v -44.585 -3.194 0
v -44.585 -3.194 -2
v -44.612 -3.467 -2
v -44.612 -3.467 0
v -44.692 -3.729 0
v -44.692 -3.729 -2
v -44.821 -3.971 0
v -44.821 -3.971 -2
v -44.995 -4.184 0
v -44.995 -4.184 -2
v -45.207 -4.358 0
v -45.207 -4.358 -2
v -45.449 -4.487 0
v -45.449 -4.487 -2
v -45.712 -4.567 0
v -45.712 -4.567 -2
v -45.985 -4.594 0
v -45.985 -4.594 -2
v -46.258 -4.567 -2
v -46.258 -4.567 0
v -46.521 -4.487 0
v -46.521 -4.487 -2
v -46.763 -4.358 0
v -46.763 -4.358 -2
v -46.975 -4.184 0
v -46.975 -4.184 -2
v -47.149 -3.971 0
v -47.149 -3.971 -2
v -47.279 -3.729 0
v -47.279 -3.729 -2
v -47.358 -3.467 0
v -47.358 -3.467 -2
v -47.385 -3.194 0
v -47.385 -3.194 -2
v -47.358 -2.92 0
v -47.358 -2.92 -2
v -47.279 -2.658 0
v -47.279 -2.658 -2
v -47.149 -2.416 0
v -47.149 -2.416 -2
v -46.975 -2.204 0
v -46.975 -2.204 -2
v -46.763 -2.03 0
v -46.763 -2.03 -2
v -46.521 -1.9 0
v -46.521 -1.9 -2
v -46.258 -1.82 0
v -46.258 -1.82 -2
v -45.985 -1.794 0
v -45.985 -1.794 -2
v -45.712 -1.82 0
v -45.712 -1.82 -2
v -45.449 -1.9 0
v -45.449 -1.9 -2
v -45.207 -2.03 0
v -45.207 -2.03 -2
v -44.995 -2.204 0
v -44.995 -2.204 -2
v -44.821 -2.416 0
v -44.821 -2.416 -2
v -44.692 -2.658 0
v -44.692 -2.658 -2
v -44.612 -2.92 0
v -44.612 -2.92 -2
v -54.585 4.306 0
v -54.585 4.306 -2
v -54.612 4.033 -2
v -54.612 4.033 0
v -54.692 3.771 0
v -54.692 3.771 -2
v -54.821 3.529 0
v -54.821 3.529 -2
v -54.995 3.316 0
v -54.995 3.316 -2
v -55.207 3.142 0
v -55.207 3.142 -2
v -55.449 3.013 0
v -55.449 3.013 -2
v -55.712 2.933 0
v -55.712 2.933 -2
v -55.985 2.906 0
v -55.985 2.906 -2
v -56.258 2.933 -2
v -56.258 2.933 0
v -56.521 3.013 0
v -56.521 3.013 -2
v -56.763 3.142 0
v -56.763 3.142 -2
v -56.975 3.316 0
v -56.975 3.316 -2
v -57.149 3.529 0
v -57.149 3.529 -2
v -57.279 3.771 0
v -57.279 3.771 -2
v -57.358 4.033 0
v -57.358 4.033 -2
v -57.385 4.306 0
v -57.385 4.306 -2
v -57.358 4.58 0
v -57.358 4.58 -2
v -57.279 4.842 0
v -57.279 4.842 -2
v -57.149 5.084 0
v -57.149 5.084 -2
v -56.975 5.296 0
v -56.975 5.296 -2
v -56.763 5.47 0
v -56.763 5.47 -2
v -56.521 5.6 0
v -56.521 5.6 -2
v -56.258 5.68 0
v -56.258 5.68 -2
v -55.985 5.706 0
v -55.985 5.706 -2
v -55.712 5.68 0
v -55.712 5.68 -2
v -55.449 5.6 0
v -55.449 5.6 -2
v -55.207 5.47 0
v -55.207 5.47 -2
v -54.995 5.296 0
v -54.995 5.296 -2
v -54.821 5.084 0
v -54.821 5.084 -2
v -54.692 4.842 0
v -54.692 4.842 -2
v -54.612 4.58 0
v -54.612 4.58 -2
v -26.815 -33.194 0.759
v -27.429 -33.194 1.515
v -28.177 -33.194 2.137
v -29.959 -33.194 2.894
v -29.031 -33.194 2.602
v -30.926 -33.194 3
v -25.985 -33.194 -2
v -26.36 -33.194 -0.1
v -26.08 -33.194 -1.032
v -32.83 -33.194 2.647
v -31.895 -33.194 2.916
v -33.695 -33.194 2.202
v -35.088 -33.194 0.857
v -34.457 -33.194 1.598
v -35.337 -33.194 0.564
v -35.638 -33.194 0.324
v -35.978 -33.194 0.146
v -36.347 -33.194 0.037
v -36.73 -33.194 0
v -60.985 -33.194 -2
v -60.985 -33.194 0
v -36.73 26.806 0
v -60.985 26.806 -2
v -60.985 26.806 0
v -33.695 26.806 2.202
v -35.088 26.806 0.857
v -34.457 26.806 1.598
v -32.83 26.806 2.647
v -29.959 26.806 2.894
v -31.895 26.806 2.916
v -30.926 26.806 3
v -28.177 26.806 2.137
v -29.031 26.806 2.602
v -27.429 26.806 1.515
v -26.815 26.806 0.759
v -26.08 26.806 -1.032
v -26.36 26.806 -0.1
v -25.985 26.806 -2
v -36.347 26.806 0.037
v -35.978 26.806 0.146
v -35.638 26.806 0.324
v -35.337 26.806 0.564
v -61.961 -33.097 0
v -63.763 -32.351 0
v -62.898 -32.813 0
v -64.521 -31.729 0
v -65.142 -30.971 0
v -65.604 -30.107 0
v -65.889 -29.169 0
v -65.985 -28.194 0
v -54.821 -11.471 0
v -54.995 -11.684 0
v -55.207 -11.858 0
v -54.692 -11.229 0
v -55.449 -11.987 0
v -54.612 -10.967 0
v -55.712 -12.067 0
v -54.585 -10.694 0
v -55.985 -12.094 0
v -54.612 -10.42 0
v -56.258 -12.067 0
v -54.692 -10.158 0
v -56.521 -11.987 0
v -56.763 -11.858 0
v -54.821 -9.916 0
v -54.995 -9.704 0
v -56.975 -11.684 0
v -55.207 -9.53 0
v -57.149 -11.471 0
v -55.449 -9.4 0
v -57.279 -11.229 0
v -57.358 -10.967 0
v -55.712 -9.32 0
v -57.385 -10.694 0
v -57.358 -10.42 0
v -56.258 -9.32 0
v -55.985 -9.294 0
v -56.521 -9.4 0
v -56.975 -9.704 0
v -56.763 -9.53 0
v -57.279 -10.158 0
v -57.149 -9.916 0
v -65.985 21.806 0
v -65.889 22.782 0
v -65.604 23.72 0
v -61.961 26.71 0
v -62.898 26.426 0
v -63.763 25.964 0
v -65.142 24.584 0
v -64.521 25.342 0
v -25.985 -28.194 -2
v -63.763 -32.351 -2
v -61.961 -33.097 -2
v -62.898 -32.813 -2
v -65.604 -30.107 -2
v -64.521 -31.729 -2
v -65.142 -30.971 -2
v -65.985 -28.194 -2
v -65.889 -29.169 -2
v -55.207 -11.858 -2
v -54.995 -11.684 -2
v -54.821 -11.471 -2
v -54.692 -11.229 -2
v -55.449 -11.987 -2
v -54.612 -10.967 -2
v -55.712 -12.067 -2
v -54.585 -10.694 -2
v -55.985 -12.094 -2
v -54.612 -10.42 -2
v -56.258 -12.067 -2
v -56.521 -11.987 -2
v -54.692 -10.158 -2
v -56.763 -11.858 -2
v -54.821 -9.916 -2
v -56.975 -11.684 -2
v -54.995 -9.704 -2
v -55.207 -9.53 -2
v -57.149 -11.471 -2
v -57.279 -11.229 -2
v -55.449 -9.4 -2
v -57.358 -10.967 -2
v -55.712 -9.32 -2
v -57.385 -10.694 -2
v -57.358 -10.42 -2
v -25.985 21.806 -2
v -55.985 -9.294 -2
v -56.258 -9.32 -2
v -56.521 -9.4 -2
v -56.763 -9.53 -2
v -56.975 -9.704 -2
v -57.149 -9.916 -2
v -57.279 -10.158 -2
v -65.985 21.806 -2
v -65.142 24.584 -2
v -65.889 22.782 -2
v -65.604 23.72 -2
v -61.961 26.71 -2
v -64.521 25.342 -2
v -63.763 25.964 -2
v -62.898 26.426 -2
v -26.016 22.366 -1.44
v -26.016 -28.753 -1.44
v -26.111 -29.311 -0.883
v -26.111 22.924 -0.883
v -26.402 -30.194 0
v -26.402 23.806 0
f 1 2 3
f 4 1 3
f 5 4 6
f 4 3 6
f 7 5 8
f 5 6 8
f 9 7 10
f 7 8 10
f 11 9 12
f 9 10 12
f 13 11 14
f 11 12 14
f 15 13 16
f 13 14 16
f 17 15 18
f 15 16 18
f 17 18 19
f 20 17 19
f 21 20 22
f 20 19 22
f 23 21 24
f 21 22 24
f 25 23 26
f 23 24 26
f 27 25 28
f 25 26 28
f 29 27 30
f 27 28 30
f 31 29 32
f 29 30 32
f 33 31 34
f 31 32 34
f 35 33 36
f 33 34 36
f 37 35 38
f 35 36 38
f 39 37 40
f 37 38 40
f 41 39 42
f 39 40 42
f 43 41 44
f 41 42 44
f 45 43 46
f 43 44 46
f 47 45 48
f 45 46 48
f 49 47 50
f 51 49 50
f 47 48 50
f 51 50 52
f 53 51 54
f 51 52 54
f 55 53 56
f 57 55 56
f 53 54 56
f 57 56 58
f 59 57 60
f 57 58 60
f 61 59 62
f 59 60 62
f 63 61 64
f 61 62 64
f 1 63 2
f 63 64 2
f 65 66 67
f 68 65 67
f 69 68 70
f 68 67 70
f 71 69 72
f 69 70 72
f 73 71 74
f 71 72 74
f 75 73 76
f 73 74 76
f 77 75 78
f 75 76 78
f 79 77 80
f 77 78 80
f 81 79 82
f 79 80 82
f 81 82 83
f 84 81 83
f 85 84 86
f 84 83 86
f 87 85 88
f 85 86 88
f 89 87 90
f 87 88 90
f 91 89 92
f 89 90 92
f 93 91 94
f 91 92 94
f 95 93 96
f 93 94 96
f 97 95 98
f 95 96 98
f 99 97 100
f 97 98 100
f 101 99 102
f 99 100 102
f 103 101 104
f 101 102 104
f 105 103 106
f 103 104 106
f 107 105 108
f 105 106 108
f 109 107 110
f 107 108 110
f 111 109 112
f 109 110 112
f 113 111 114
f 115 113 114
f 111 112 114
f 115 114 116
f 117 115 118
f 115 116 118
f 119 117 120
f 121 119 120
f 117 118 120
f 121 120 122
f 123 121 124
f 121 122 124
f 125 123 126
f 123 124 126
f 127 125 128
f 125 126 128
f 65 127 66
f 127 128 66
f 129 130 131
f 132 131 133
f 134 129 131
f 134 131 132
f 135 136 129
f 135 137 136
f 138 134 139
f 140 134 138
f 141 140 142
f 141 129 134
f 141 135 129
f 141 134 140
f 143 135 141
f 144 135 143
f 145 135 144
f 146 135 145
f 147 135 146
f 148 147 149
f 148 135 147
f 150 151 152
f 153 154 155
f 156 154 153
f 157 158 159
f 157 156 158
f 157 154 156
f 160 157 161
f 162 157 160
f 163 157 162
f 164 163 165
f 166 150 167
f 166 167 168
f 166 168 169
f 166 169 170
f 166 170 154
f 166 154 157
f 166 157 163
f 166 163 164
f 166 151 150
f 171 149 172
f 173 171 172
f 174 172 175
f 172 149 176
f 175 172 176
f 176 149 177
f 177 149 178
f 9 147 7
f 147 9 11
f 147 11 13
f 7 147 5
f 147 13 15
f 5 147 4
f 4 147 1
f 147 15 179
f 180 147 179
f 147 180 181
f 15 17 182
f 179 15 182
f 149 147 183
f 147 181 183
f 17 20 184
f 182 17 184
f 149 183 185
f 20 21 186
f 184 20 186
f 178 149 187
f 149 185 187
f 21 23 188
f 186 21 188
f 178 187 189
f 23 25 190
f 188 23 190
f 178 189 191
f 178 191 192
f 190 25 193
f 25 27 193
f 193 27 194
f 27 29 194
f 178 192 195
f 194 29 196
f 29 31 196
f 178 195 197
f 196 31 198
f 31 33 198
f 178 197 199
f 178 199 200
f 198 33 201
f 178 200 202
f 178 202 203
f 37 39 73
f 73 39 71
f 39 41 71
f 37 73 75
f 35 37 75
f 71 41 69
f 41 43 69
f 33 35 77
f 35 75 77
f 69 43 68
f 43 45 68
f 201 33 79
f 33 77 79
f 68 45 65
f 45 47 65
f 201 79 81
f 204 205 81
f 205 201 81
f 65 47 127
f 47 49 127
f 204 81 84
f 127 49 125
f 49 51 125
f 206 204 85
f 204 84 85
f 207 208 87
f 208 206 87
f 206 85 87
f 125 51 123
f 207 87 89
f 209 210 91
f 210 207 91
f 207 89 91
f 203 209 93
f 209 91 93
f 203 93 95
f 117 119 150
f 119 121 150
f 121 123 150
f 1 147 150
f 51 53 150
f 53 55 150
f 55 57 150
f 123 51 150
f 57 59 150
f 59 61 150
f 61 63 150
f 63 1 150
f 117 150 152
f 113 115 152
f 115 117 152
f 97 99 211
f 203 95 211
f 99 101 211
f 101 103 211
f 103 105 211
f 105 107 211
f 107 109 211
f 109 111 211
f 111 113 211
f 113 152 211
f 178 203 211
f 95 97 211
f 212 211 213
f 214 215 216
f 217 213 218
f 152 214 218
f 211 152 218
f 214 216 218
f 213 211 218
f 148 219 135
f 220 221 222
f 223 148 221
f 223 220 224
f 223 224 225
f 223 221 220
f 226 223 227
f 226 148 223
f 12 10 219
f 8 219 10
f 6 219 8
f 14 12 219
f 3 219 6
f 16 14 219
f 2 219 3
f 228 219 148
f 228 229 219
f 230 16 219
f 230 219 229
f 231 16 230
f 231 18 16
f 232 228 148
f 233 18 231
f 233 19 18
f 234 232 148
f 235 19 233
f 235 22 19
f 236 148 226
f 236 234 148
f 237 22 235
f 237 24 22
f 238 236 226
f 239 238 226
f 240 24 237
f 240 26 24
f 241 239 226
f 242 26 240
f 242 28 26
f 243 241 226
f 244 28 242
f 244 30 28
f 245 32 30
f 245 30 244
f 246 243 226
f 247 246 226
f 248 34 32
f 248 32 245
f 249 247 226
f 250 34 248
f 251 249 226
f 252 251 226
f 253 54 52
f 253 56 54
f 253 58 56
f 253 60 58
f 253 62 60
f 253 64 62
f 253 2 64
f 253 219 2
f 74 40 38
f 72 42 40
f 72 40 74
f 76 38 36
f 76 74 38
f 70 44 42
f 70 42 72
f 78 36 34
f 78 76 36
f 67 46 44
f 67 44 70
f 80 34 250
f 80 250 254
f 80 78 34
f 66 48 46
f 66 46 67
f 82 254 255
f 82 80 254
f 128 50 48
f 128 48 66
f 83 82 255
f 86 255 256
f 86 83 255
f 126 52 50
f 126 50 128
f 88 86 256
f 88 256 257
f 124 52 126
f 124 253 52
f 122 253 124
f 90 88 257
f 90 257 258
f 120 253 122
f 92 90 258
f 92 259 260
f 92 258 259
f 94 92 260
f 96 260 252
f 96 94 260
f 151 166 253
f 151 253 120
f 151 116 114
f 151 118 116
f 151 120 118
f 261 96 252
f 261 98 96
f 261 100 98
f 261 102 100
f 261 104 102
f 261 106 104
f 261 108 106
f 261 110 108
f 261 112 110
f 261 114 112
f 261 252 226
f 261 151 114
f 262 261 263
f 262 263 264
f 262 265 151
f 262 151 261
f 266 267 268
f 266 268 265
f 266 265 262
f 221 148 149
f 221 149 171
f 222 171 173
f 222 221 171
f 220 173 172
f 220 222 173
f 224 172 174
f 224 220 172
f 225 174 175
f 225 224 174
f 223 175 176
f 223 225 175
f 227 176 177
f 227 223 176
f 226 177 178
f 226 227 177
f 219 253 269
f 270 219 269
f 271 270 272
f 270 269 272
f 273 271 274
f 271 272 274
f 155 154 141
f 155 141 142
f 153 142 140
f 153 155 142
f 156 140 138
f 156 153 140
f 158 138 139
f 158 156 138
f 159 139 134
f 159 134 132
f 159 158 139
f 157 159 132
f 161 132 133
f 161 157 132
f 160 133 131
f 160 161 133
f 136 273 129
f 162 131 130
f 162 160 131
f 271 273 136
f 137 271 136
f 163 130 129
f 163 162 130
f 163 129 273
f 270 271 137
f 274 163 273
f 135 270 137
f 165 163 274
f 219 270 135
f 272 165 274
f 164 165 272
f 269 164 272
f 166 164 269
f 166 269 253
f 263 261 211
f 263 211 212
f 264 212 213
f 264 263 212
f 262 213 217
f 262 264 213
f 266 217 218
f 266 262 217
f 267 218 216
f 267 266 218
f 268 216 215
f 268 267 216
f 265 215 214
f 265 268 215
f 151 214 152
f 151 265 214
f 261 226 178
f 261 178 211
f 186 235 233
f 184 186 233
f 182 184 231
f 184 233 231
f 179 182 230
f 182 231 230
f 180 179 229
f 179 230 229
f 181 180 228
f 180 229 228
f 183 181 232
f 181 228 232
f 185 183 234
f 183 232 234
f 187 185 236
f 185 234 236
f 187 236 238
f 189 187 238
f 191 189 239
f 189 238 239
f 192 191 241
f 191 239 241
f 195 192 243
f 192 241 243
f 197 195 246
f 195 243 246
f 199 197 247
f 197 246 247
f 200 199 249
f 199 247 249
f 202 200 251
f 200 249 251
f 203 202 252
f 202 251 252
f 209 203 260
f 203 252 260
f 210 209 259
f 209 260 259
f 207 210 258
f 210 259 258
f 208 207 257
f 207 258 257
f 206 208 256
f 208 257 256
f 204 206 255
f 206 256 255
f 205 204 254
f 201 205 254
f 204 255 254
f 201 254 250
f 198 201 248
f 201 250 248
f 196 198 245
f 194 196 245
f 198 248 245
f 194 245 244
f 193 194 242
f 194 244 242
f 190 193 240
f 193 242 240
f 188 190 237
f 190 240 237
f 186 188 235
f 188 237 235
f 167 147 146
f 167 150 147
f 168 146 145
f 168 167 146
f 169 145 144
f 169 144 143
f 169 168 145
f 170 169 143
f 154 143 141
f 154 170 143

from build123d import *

# Parameters (mm, degrees)
SKETCH1_R           = 1.4
BOSS_EXTRUDE1_DEPTH = 2
BOSS_EXTRUDE2_DEPTH = 60
CUT_EXTRUDE1_DEPTH  = 60
FILLET1_R           = 2


with BuildPart() as part:
    # Sketch1 → Boss-Extrude1 (new body)
    with BuildSketch(Plane(origin=(0, 0, -2), x_dir=(-1, 0, 0), z_dir=(0, 0, -1))):
        with BuildLine():
            Line((60.9850693, 26.806434403), (30.9850693, 26.806434403))
            ThreePointArc((30.9850693, 26.806434403), (27.449535394, 25.341968309), (25.9850693, 21.806434403))
            Line((25.9850693, 21.806434403), (25.9850693, -28.193565597))
            ThreePointArc((25.9850693, -28.193565597), (27.449535394, -31.729099503), (30.9850693, -33.193565597))
            Line((30.9850693, -33.193565597), (60.9850693, -33.193565597))
            ThreePointArc((60.9850693, -33.193565597), (64.520603206, -31.729099503), (65.9850693, -28.193565597))
            Line((65.9850693, -28.193565597), (65.9850693, 21.806434403))
            ThreePointArc((65.9850693, 21.806434403), (64.520603206, 25.341968309), (60.9850693, 26.806434403))
        make_face()
        with Locations((55.9850693, 4.306434403)):
            Circle(SKETCH1_R, mode=Mode.SUBTRACT)
        with Locations((55.9850693, -10.693565597)):
            Circle(SKETCH1_R, mode=Mode.SUBTRACT)
        with Locations((45.9850693, -3.193565597)):
            Circle(SKETCH1_R, mode=Mode.SUBTRACT)
    extrude(amount=-BOSS_EXTRUDE1_DEPTH)

    # Sketch2 → Boss-Extrude2 (add)
    with BuildSketch(Plane(origin=(0, 26.806434403, 0), x_dir=(1, 0, 0), z_dir=(0, 1, 0))):
        with BuildLine():
            Line((-25.9850693, 2), (-35.9850693, 2))
            ThreePointArc((-35.9850693, 2), (-30.9850693, -3), (-25.9850693, 2))
        make_face()
    extrude(amount=-BOSS_EXTRUDE2_DEPTH)

    # Sketch3 → Cut-Extrude1 (cut)
    with BuildSketch(Plane(origin=(0, 26.806434403, 0), x_dir=(1, 0, 0), z_dir=(0, 1, 0))):
        with BuildLine():
            Line((-26.402493605, 0), (-25.9850693, 0))
            Line((-25.9850693, 0), (-25.9850693, 2))
            ThreePointArc((-25.9850693, 2), (-26.090537735, 0.978451782), (-26.402493605, 0))
        make_face()
    extrude(amount=-CUT_EXTRUDE1_DEPTH, mode=Mode.SUBTRACT)

    # Fillet1
    fillet1_edges = [part.edges().sort_by_distance(p)[0] for p in [
        (-35.567644995, -3.193565597, 0),
    ]]
    fillet(fillet1_edges, radius=FILLET1_R)


solid = part.part
